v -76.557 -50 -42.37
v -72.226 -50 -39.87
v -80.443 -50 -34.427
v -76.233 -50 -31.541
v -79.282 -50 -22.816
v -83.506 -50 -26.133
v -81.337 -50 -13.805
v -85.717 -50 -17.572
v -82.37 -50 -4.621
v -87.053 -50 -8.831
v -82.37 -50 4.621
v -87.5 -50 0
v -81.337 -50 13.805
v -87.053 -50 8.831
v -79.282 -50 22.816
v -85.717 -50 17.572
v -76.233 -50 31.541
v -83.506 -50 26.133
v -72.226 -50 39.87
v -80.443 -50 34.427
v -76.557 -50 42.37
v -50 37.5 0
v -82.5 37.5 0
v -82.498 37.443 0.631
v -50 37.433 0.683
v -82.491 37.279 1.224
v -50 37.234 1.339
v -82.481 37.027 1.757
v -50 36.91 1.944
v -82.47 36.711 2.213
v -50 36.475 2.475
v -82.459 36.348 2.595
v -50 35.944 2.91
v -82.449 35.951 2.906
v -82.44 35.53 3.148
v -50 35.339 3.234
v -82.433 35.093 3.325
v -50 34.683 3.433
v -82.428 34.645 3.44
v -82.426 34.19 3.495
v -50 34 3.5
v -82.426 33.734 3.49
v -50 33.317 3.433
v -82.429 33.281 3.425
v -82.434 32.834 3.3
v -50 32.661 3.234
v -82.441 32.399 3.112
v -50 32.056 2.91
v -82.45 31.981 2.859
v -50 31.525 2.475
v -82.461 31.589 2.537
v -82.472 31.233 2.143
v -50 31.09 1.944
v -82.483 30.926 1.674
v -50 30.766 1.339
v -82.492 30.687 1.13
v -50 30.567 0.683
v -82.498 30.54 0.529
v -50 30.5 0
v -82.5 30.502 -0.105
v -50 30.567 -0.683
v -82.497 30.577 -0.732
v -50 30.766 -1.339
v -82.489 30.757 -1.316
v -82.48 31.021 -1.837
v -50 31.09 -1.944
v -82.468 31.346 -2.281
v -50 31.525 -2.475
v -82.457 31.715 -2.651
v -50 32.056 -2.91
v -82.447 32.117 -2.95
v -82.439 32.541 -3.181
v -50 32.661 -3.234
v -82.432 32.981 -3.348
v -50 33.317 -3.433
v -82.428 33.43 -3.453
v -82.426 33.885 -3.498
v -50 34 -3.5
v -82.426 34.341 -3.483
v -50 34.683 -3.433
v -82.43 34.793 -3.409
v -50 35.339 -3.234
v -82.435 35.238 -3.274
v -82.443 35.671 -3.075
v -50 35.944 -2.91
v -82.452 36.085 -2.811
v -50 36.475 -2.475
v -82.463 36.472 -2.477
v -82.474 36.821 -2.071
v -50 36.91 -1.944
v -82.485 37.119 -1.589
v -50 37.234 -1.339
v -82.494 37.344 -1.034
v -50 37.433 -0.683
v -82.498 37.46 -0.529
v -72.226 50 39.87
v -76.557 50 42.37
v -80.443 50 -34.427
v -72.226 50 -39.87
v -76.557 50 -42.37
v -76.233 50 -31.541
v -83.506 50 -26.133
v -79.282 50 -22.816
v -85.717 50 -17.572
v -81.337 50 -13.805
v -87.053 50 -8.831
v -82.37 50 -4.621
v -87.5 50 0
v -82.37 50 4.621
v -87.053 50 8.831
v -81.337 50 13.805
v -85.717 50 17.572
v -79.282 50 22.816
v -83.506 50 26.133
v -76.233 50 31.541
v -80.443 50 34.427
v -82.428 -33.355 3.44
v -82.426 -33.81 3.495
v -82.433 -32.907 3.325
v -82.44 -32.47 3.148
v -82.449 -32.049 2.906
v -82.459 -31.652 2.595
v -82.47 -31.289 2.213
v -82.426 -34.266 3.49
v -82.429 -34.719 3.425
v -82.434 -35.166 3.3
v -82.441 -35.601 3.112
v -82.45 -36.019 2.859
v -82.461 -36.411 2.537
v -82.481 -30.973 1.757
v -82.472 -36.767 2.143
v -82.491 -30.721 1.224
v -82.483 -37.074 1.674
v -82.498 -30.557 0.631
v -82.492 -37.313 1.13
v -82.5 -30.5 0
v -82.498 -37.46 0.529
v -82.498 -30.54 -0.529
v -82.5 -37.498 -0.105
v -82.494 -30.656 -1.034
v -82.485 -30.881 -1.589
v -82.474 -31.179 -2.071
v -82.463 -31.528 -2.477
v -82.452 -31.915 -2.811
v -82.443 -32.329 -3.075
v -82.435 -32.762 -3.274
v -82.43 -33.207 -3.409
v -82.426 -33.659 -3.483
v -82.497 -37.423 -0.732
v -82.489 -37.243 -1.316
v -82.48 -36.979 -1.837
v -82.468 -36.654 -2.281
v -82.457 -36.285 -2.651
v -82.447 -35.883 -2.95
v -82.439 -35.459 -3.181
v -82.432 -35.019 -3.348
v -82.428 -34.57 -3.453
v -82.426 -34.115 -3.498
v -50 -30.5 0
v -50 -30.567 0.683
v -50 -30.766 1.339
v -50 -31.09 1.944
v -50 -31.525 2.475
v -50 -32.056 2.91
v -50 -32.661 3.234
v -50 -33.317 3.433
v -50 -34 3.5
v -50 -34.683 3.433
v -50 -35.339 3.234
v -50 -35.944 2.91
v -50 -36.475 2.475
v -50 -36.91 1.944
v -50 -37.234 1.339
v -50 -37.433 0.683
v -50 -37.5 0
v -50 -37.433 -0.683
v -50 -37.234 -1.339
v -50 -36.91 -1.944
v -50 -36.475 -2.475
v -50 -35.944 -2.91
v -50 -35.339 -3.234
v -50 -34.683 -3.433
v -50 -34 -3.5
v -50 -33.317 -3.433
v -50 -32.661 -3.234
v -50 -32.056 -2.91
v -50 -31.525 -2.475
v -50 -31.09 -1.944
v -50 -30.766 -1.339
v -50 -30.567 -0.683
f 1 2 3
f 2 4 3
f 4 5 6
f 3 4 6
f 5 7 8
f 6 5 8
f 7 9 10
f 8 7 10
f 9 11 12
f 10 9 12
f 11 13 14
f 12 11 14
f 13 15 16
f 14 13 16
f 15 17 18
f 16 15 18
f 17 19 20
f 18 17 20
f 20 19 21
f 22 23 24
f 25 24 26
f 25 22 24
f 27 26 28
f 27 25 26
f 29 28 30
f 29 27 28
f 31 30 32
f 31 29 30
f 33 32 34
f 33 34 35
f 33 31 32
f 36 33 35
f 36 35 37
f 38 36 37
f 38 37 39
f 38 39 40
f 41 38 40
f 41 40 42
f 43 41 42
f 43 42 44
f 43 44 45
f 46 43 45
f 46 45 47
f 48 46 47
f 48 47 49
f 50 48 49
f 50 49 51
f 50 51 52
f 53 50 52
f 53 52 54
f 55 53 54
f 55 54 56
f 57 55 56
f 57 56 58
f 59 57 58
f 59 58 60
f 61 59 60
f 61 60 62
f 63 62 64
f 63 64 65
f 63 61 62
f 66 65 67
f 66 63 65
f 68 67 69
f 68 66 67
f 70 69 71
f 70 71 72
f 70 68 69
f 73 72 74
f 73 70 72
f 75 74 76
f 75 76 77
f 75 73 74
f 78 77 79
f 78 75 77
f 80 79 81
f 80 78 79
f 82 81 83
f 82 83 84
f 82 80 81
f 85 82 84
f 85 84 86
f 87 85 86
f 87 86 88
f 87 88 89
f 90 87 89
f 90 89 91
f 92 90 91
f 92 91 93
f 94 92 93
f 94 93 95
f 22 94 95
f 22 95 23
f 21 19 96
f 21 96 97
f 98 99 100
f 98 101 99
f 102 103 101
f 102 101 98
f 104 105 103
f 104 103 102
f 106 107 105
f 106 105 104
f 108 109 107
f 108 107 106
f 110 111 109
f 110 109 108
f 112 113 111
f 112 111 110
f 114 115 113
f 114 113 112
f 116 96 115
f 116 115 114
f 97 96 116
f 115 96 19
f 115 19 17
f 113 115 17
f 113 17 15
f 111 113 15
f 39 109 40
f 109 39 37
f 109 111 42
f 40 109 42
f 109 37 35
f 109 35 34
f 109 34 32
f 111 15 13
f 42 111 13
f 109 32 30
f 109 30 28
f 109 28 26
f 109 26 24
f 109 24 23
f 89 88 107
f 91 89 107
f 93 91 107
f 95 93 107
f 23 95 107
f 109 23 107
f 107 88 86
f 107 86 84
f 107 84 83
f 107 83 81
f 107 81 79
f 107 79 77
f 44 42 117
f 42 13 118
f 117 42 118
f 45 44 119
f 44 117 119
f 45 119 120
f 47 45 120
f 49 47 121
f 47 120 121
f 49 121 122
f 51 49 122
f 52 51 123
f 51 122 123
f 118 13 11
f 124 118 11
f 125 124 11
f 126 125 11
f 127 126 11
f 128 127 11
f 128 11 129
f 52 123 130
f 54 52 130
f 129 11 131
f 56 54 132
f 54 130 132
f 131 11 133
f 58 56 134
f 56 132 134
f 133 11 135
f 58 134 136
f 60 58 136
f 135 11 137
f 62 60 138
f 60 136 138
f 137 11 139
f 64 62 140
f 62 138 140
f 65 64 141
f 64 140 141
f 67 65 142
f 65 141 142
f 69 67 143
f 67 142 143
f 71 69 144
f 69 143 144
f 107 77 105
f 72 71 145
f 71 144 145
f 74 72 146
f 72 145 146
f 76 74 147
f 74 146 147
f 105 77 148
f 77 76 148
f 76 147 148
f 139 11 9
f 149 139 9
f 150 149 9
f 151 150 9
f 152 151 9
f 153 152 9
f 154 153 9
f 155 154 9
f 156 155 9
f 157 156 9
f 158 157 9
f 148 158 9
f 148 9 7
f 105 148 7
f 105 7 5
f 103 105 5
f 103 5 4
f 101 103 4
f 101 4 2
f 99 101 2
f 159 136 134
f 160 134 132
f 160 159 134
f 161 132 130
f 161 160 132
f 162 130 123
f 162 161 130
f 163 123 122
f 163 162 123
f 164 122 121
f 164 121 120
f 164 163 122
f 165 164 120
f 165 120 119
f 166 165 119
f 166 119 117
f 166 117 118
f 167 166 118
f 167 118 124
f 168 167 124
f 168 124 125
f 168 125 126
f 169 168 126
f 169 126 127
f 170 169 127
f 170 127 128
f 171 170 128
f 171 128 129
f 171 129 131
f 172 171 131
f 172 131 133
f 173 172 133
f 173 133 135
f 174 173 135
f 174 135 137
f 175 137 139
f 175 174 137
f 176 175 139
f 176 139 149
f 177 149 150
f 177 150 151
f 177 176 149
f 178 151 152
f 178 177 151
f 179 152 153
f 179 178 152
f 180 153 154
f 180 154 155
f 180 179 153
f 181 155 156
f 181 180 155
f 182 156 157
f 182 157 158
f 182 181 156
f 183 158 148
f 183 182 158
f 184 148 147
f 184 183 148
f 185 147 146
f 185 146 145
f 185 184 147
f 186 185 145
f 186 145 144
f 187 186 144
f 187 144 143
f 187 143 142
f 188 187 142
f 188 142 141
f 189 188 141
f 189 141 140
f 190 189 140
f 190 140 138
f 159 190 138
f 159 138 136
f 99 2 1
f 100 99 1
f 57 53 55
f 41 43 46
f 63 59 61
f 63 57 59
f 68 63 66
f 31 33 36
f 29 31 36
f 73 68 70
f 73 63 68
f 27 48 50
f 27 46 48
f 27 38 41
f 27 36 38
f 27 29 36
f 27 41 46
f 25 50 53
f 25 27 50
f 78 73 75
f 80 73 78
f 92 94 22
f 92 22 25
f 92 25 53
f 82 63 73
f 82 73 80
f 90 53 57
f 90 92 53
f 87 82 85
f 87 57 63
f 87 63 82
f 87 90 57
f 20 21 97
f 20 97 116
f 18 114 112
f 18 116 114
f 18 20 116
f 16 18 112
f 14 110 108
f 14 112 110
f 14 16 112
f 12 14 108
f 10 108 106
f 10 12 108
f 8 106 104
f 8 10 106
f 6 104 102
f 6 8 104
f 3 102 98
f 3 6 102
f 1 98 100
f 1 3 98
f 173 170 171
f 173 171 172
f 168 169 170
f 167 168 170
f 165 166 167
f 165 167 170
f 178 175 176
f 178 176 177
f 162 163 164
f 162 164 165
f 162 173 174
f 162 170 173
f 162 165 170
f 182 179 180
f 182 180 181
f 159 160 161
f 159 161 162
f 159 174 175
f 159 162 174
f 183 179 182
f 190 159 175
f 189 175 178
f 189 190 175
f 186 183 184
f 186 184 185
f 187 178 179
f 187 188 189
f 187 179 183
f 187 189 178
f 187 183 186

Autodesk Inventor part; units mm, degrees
ref_plane "YZ Plane" through (0, 0, 0) normal (1, 0, 0) x (0, 1, 0)
ref_plane "XZ Plane" through (0, 0, 0) normal (0, 1, 0) x (-1, 0, 0)
ref_plane "XY Plane" through (0, 0, 0) normal (0, 0, 1) x (1, 0, 0)
sketch "Sketch1" plane through (0, 0, 0) normal (0, 1, 0) x (-1, 0, 0)
  arc A0 (-87.5, 0) -> (0, 87.5) centre (0, 0) ccw
  arc A1 (-82.5, 0) -> (0, 82.5) centre (0, 0) ccw
  line L0 (0, 87.5) -> (0, 82.5)
  line L1 (-82.5, 0) -> (-87.5, 0)
  dimension "d0" = 165
  dimension "d1" = 175
  dimension "d7" = 0
  dimension "d8" = 0
extrude "Extrusion1" add sketch "Sketch1" along normal mid plane 100
sketch "Sketch5" plane through (0, 0, 0) normal (1, 0, 0) x (0, 1, 0)
  line L0 (-50, 0) -> (50, 0) projected
  circle A0 centre (34, 0) radius 3.5
  circle A1 centre (-34, 0) radius 3.5
  point P0 (0, 0)
  dimension "d22" = 7
  dimension "d23" = 7
  dimension "d24" = 68
  dimension "d25" = 34
extrude "Extrusion4" add sketch "Sketch5" against normal up to next
sketch "Sketch6" plane through (0, 34, 0) normal (1, 0, 0) x (0, 0, -1)
  circle A0 centre (0, 0) radius 3.5
  line L0 (0, -84) -> (0, 16) projected
  circle A1 centre (0, -68.0281) radius 3.5281
  point P0 (0, -34)
extrude "Extrusion5" cut sketch "Sketch6" against normal blind 50
sketch "Sketch7" plane through (0, 50, 0) normal (0, 1, 0) x (1, 0, 0)
  arc A0 (87.5, 0) -> (0, -87.5) centre (0, 0) ccw construction
  arc A1 (82.5, 0) -> (0, -82.5) centre (0, 0) ccw construction
  arc A2 (-87.5, 0) -> (-76.5573, -42.3702) centre (0, 0) ccw
  arc A3 (-82.5, 0) -> (-72.2264, -39.8698) centre (0, 0) ccw
  line L0 (-72.2264, -39.8698) -> (-76.5573, -42.3702)
  line L1 (0, 0) -> (-87.5, 0) construction
  arc A4 (0, 87.5) -> (87.5, 0) centre (0, 0) ccw construction
  arc A5 (0, 82.5) -> (82.5, 0) centre (0, 0) ccw construction
  arc A6 (-76.5573, 42.3702) -> (-87.5, 0) centre (0, 0) ccw
  arc A7 (-72.2264, 39.8698) -> (-82.5, 0) centre (0, 0) ccw
  line L2 (-72.2264, 39.8698) -> (-76.5573, 42.3702)
  arc A8 (82.5, 0) -> (-72.2264, 39.8698) centre (0, 0) ccw
  arc A9 (87.5, 0) -> (-76.5573, 42.3702) centre (0, 0) ccw
  arc A10 (-76.5573, -42.3702) -> (0, -87.5) centre (0, 0) ccw
  arc A11 (-72.2264, -39.8698) -> (0, -82.5) centre (0, 0) ccw
  line L3 (-156.1445, -133.794) -> (99.266, -133.794)
  line L4 (99.266, -133.794) -> (99.266, 159.7464)
  line L5 (99.266, 159.7464) -> (-156.1445, 159.7464)
  line L6 (-156.1445, 159.7464) -> (-156.1445, -133.794)
  circle A12 centre (0, 0) radius 82.5
  point P0 (0, -82.5)
  dimension "d30" = 30
  dimension "d31" = 45.3349
  dimension "d32" = 0
  dimension "d33" = 255.4104
  dimension "d34" = 293.5404
  dimension "d35" = 159.7464
  dimension "d36" = 11.766
extrude "Extrusion6" cut sketch "Sketch7" against normal up to next
sketch "Sketch3" plane through (0, 0, 0) normal (1, 0, 0) x (0, 1, 0)
  circle A0 centre (0, 34) radius 3.5
  circle A1 centre (0, -34) radius 3.5
  circle A2 centre (0, 34) radius 3.5
  circle A3 centre (0, -34) radius 3.5
  point P0 (0, 0)
  dimension "d9" = 7
  dimension "d10" = 7
  dimension "d11" = 68
  dimension "d12" = 34
  dimension "d13" = 34
sketch "Sketch4" plane through (0, 0, 34) normal (1, 0, 0) x (0, 0, -1)
  circle A0 centre (0, 0) radius 3.5
  circle A1 centre (68, 0) radius 3.5 projected
  circle A2 centre (68, 0) radius 3.5
  point P0 (34, 0)
equation "\"d26\" = d23"
properties part number "airframe"
